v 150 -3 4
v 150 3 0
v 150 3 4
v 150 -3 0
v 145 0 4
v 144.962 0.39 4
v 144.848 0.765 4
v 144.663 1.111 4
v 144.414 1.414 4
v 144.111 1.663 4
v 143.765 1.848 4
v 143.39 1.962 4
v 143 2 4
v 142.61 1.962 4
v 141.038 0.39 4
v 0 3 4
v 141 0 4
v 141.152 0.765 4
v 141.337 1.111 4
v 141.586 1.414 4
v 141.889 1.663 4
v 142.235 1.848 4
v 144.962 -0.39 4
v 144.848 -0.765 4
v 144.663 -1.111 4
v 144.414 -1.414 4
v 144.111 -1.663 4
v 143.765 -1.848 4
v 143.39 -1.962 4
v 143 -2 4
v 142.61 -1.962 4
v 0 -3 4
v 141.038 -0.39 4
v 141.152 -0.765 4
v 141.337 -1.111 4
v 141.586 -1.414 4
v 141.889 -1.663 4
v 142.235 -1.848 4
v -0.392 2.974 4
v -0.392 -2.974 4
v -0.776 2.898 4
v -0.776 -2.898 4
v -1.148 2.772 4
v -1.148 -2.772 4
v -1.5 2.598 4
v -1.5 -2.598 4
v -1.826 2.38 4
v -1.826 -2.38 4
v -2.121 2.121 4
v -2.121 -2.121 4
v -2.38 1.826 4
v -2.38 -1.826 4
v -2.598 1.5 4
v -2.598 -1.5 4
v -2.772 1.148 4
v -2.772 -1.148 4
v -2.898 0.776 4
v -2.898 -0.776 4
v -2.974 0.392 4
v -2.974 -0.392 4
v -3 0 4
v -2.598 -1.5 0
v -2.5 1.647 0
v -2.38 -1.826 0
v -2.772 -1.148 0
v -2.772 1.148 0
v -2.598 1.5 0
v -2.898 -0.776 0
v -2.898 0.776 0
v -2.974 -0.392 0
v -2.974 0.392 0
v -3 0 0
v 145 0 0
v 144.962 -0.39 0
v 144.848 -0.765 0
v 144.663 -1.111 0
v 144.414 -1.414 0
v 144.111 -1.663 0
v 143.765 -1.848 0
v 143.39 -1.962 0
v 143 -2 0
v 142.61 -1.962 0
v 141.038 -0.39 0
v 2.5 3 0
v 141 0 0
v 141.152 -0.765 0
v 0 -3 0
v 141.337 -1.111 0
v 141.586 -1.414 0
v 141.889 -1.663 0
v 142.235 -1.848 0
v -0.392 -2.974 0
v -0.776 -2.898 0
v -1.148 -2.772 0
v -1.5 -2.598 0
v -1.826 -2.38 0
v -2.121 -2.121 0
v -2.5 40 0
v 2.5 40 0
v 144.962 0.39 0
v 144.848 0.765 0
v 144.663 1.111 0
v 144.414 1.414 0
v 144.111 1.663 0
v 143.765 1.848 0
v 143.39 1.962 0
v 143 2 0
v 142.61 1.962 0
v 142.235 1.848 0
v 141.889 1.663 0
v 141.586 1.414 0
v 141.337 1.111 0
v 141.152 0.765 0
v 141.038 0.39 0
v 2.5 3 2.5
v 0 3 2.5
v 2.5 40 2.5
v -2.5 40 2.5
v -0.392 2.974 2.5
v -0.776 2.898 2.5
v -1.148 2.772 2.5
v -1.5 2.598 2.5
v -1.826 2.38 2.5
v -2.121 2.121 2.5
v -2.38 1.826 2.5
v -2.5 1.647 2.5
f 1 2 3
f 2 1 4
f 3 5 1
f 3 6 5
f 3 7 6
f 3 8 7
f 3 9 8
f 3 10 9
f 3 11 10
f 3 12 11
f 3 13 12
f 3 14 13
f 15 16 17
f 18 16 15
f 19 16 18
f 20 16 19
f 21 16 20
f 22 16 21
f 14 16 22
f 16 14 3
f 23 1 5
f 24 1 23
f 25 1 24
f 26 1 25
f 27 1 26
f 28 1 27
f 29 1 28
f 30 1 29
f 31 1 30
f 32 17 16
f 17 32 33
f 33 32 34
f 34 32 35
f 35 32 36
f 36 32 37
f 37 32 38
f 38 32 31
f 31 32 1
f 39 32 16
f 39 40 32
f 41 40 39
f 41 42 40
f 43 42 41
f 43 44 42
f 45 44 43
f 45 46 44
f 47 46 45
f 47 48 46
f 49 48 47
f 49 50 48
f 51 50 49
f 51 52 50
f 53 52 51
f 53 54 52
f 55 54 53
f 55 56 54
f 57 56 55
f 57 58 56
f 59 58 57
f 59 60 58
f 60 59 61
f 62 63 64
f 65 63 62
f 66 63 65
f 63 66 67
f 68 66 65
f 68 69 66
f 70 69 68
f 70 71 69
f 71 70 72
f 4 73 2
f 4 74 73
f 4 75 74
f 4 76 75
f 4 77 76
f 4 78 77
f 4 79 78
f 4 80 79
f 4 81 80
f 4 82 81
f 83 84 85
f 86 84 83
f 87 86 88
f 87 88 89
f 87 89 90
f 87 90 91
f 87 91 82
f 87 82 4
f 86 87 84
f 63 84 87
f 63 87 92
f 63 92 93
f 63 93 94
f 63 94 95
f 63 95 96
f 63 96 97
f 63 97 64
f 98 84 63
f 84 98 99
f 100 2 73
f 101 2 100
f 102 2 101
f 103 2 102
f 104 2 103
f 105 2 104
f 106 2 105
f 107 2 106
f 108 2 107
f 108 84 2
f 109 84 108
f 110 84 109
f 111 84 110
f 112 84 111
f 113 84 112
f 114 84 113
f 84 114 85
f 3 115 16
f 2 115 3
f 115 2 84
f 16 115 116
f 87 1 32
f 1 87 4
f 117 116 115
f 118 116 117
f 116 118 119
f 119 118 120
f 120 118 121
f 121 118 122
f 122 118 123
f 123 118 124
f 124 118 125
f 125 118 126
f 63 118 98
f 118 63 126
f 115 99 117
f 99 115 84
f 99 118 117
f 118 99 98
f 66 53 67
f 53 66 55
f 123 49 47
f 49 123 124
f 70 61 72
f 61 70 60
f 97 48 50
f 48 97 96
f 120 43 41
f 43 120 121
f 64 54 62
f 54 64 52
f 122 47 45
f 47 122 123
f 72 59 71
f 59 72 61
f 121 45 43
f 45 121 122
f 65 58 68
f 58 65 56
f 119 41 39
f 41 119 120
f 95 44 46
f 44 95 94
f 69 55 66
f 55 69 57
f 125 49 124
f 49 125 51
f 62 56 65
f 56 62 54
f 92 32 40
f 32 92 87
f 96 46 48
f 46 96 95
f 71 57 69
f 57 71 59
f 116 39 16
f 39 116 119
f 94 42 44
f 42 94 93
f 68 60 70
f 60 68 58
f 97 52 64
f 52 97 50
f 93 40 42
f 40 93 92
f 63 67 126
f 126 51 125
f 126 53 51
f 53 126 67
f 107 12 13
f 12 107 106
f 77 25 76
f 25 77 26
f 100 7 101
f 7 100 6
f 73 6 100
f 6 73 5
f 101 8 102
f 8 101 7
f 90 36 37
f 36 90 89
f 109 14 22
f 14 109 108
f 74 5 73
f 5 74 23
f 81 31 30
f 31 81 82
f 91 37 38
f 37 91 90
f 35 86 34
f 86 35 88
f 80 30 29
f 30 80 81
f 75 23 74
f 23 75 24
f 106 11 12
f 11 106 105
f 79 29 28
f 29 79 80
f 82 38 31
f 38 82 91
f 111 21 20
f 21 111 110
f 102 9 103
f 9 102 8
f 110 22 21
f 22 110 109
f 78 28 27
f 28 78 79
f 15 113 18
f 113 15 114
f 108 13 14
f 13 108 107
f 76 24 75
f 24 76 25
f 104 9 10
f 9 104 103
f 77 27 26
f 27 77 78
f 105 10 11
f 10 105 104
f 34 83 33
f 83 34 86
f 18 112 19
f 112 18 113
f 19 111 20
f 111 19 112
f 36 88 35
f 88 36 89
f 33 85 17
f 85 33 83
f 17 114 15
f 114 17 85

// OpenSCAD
// KNOWN-WRONG PART (must fail): the foot is at 90 degrees to the handle instead of 120
// L-shaped ("hockey-stick") cell spreader for plating bacteria
// Category: tools. A flat handle and a thinner spreading foot at 120 degrees, joined by a round
// boss; the foot's bed side is the smooth spreading face. Hanging hole at the handle end.
// Print: PETG or PP, lying flat, 0.15 mm layers, 100 % infill; sterilise with 70 % ethanol
// (or autoclave only if printed in PP).
// SPDX-License-Identifier: CERN-OHL-P-2.0

/* [Spreader] */
handle = [150, 6, 4];     // length (X), width (Y), thickness (Z)
foot = [40, 5, 2.5];      // length along its centre line, width, thickness
foot_angle = 90;          // counter-clockwise from +X, seen from above
boss_d = 6;               // joins the bars at the origin, full handle thickness
hole_d = 4;
hole_x = 143;

/* [Hidden] */
eps = 0.01;

difference() {
    union() {
        translate([0, -handle.y / 2, 0]) cube(handle);
        rotate([0, 0, foot_angle]) translate([0, -foot.y / 2, 0]) cube(foot);
        cylinder(d = boss_d, h = handle.z, $fn = 48);
    }
    translate([hole_x, 0, -1]) cylinder(d = hole_d, h = handle.z + 2, $fn = 32);
}
